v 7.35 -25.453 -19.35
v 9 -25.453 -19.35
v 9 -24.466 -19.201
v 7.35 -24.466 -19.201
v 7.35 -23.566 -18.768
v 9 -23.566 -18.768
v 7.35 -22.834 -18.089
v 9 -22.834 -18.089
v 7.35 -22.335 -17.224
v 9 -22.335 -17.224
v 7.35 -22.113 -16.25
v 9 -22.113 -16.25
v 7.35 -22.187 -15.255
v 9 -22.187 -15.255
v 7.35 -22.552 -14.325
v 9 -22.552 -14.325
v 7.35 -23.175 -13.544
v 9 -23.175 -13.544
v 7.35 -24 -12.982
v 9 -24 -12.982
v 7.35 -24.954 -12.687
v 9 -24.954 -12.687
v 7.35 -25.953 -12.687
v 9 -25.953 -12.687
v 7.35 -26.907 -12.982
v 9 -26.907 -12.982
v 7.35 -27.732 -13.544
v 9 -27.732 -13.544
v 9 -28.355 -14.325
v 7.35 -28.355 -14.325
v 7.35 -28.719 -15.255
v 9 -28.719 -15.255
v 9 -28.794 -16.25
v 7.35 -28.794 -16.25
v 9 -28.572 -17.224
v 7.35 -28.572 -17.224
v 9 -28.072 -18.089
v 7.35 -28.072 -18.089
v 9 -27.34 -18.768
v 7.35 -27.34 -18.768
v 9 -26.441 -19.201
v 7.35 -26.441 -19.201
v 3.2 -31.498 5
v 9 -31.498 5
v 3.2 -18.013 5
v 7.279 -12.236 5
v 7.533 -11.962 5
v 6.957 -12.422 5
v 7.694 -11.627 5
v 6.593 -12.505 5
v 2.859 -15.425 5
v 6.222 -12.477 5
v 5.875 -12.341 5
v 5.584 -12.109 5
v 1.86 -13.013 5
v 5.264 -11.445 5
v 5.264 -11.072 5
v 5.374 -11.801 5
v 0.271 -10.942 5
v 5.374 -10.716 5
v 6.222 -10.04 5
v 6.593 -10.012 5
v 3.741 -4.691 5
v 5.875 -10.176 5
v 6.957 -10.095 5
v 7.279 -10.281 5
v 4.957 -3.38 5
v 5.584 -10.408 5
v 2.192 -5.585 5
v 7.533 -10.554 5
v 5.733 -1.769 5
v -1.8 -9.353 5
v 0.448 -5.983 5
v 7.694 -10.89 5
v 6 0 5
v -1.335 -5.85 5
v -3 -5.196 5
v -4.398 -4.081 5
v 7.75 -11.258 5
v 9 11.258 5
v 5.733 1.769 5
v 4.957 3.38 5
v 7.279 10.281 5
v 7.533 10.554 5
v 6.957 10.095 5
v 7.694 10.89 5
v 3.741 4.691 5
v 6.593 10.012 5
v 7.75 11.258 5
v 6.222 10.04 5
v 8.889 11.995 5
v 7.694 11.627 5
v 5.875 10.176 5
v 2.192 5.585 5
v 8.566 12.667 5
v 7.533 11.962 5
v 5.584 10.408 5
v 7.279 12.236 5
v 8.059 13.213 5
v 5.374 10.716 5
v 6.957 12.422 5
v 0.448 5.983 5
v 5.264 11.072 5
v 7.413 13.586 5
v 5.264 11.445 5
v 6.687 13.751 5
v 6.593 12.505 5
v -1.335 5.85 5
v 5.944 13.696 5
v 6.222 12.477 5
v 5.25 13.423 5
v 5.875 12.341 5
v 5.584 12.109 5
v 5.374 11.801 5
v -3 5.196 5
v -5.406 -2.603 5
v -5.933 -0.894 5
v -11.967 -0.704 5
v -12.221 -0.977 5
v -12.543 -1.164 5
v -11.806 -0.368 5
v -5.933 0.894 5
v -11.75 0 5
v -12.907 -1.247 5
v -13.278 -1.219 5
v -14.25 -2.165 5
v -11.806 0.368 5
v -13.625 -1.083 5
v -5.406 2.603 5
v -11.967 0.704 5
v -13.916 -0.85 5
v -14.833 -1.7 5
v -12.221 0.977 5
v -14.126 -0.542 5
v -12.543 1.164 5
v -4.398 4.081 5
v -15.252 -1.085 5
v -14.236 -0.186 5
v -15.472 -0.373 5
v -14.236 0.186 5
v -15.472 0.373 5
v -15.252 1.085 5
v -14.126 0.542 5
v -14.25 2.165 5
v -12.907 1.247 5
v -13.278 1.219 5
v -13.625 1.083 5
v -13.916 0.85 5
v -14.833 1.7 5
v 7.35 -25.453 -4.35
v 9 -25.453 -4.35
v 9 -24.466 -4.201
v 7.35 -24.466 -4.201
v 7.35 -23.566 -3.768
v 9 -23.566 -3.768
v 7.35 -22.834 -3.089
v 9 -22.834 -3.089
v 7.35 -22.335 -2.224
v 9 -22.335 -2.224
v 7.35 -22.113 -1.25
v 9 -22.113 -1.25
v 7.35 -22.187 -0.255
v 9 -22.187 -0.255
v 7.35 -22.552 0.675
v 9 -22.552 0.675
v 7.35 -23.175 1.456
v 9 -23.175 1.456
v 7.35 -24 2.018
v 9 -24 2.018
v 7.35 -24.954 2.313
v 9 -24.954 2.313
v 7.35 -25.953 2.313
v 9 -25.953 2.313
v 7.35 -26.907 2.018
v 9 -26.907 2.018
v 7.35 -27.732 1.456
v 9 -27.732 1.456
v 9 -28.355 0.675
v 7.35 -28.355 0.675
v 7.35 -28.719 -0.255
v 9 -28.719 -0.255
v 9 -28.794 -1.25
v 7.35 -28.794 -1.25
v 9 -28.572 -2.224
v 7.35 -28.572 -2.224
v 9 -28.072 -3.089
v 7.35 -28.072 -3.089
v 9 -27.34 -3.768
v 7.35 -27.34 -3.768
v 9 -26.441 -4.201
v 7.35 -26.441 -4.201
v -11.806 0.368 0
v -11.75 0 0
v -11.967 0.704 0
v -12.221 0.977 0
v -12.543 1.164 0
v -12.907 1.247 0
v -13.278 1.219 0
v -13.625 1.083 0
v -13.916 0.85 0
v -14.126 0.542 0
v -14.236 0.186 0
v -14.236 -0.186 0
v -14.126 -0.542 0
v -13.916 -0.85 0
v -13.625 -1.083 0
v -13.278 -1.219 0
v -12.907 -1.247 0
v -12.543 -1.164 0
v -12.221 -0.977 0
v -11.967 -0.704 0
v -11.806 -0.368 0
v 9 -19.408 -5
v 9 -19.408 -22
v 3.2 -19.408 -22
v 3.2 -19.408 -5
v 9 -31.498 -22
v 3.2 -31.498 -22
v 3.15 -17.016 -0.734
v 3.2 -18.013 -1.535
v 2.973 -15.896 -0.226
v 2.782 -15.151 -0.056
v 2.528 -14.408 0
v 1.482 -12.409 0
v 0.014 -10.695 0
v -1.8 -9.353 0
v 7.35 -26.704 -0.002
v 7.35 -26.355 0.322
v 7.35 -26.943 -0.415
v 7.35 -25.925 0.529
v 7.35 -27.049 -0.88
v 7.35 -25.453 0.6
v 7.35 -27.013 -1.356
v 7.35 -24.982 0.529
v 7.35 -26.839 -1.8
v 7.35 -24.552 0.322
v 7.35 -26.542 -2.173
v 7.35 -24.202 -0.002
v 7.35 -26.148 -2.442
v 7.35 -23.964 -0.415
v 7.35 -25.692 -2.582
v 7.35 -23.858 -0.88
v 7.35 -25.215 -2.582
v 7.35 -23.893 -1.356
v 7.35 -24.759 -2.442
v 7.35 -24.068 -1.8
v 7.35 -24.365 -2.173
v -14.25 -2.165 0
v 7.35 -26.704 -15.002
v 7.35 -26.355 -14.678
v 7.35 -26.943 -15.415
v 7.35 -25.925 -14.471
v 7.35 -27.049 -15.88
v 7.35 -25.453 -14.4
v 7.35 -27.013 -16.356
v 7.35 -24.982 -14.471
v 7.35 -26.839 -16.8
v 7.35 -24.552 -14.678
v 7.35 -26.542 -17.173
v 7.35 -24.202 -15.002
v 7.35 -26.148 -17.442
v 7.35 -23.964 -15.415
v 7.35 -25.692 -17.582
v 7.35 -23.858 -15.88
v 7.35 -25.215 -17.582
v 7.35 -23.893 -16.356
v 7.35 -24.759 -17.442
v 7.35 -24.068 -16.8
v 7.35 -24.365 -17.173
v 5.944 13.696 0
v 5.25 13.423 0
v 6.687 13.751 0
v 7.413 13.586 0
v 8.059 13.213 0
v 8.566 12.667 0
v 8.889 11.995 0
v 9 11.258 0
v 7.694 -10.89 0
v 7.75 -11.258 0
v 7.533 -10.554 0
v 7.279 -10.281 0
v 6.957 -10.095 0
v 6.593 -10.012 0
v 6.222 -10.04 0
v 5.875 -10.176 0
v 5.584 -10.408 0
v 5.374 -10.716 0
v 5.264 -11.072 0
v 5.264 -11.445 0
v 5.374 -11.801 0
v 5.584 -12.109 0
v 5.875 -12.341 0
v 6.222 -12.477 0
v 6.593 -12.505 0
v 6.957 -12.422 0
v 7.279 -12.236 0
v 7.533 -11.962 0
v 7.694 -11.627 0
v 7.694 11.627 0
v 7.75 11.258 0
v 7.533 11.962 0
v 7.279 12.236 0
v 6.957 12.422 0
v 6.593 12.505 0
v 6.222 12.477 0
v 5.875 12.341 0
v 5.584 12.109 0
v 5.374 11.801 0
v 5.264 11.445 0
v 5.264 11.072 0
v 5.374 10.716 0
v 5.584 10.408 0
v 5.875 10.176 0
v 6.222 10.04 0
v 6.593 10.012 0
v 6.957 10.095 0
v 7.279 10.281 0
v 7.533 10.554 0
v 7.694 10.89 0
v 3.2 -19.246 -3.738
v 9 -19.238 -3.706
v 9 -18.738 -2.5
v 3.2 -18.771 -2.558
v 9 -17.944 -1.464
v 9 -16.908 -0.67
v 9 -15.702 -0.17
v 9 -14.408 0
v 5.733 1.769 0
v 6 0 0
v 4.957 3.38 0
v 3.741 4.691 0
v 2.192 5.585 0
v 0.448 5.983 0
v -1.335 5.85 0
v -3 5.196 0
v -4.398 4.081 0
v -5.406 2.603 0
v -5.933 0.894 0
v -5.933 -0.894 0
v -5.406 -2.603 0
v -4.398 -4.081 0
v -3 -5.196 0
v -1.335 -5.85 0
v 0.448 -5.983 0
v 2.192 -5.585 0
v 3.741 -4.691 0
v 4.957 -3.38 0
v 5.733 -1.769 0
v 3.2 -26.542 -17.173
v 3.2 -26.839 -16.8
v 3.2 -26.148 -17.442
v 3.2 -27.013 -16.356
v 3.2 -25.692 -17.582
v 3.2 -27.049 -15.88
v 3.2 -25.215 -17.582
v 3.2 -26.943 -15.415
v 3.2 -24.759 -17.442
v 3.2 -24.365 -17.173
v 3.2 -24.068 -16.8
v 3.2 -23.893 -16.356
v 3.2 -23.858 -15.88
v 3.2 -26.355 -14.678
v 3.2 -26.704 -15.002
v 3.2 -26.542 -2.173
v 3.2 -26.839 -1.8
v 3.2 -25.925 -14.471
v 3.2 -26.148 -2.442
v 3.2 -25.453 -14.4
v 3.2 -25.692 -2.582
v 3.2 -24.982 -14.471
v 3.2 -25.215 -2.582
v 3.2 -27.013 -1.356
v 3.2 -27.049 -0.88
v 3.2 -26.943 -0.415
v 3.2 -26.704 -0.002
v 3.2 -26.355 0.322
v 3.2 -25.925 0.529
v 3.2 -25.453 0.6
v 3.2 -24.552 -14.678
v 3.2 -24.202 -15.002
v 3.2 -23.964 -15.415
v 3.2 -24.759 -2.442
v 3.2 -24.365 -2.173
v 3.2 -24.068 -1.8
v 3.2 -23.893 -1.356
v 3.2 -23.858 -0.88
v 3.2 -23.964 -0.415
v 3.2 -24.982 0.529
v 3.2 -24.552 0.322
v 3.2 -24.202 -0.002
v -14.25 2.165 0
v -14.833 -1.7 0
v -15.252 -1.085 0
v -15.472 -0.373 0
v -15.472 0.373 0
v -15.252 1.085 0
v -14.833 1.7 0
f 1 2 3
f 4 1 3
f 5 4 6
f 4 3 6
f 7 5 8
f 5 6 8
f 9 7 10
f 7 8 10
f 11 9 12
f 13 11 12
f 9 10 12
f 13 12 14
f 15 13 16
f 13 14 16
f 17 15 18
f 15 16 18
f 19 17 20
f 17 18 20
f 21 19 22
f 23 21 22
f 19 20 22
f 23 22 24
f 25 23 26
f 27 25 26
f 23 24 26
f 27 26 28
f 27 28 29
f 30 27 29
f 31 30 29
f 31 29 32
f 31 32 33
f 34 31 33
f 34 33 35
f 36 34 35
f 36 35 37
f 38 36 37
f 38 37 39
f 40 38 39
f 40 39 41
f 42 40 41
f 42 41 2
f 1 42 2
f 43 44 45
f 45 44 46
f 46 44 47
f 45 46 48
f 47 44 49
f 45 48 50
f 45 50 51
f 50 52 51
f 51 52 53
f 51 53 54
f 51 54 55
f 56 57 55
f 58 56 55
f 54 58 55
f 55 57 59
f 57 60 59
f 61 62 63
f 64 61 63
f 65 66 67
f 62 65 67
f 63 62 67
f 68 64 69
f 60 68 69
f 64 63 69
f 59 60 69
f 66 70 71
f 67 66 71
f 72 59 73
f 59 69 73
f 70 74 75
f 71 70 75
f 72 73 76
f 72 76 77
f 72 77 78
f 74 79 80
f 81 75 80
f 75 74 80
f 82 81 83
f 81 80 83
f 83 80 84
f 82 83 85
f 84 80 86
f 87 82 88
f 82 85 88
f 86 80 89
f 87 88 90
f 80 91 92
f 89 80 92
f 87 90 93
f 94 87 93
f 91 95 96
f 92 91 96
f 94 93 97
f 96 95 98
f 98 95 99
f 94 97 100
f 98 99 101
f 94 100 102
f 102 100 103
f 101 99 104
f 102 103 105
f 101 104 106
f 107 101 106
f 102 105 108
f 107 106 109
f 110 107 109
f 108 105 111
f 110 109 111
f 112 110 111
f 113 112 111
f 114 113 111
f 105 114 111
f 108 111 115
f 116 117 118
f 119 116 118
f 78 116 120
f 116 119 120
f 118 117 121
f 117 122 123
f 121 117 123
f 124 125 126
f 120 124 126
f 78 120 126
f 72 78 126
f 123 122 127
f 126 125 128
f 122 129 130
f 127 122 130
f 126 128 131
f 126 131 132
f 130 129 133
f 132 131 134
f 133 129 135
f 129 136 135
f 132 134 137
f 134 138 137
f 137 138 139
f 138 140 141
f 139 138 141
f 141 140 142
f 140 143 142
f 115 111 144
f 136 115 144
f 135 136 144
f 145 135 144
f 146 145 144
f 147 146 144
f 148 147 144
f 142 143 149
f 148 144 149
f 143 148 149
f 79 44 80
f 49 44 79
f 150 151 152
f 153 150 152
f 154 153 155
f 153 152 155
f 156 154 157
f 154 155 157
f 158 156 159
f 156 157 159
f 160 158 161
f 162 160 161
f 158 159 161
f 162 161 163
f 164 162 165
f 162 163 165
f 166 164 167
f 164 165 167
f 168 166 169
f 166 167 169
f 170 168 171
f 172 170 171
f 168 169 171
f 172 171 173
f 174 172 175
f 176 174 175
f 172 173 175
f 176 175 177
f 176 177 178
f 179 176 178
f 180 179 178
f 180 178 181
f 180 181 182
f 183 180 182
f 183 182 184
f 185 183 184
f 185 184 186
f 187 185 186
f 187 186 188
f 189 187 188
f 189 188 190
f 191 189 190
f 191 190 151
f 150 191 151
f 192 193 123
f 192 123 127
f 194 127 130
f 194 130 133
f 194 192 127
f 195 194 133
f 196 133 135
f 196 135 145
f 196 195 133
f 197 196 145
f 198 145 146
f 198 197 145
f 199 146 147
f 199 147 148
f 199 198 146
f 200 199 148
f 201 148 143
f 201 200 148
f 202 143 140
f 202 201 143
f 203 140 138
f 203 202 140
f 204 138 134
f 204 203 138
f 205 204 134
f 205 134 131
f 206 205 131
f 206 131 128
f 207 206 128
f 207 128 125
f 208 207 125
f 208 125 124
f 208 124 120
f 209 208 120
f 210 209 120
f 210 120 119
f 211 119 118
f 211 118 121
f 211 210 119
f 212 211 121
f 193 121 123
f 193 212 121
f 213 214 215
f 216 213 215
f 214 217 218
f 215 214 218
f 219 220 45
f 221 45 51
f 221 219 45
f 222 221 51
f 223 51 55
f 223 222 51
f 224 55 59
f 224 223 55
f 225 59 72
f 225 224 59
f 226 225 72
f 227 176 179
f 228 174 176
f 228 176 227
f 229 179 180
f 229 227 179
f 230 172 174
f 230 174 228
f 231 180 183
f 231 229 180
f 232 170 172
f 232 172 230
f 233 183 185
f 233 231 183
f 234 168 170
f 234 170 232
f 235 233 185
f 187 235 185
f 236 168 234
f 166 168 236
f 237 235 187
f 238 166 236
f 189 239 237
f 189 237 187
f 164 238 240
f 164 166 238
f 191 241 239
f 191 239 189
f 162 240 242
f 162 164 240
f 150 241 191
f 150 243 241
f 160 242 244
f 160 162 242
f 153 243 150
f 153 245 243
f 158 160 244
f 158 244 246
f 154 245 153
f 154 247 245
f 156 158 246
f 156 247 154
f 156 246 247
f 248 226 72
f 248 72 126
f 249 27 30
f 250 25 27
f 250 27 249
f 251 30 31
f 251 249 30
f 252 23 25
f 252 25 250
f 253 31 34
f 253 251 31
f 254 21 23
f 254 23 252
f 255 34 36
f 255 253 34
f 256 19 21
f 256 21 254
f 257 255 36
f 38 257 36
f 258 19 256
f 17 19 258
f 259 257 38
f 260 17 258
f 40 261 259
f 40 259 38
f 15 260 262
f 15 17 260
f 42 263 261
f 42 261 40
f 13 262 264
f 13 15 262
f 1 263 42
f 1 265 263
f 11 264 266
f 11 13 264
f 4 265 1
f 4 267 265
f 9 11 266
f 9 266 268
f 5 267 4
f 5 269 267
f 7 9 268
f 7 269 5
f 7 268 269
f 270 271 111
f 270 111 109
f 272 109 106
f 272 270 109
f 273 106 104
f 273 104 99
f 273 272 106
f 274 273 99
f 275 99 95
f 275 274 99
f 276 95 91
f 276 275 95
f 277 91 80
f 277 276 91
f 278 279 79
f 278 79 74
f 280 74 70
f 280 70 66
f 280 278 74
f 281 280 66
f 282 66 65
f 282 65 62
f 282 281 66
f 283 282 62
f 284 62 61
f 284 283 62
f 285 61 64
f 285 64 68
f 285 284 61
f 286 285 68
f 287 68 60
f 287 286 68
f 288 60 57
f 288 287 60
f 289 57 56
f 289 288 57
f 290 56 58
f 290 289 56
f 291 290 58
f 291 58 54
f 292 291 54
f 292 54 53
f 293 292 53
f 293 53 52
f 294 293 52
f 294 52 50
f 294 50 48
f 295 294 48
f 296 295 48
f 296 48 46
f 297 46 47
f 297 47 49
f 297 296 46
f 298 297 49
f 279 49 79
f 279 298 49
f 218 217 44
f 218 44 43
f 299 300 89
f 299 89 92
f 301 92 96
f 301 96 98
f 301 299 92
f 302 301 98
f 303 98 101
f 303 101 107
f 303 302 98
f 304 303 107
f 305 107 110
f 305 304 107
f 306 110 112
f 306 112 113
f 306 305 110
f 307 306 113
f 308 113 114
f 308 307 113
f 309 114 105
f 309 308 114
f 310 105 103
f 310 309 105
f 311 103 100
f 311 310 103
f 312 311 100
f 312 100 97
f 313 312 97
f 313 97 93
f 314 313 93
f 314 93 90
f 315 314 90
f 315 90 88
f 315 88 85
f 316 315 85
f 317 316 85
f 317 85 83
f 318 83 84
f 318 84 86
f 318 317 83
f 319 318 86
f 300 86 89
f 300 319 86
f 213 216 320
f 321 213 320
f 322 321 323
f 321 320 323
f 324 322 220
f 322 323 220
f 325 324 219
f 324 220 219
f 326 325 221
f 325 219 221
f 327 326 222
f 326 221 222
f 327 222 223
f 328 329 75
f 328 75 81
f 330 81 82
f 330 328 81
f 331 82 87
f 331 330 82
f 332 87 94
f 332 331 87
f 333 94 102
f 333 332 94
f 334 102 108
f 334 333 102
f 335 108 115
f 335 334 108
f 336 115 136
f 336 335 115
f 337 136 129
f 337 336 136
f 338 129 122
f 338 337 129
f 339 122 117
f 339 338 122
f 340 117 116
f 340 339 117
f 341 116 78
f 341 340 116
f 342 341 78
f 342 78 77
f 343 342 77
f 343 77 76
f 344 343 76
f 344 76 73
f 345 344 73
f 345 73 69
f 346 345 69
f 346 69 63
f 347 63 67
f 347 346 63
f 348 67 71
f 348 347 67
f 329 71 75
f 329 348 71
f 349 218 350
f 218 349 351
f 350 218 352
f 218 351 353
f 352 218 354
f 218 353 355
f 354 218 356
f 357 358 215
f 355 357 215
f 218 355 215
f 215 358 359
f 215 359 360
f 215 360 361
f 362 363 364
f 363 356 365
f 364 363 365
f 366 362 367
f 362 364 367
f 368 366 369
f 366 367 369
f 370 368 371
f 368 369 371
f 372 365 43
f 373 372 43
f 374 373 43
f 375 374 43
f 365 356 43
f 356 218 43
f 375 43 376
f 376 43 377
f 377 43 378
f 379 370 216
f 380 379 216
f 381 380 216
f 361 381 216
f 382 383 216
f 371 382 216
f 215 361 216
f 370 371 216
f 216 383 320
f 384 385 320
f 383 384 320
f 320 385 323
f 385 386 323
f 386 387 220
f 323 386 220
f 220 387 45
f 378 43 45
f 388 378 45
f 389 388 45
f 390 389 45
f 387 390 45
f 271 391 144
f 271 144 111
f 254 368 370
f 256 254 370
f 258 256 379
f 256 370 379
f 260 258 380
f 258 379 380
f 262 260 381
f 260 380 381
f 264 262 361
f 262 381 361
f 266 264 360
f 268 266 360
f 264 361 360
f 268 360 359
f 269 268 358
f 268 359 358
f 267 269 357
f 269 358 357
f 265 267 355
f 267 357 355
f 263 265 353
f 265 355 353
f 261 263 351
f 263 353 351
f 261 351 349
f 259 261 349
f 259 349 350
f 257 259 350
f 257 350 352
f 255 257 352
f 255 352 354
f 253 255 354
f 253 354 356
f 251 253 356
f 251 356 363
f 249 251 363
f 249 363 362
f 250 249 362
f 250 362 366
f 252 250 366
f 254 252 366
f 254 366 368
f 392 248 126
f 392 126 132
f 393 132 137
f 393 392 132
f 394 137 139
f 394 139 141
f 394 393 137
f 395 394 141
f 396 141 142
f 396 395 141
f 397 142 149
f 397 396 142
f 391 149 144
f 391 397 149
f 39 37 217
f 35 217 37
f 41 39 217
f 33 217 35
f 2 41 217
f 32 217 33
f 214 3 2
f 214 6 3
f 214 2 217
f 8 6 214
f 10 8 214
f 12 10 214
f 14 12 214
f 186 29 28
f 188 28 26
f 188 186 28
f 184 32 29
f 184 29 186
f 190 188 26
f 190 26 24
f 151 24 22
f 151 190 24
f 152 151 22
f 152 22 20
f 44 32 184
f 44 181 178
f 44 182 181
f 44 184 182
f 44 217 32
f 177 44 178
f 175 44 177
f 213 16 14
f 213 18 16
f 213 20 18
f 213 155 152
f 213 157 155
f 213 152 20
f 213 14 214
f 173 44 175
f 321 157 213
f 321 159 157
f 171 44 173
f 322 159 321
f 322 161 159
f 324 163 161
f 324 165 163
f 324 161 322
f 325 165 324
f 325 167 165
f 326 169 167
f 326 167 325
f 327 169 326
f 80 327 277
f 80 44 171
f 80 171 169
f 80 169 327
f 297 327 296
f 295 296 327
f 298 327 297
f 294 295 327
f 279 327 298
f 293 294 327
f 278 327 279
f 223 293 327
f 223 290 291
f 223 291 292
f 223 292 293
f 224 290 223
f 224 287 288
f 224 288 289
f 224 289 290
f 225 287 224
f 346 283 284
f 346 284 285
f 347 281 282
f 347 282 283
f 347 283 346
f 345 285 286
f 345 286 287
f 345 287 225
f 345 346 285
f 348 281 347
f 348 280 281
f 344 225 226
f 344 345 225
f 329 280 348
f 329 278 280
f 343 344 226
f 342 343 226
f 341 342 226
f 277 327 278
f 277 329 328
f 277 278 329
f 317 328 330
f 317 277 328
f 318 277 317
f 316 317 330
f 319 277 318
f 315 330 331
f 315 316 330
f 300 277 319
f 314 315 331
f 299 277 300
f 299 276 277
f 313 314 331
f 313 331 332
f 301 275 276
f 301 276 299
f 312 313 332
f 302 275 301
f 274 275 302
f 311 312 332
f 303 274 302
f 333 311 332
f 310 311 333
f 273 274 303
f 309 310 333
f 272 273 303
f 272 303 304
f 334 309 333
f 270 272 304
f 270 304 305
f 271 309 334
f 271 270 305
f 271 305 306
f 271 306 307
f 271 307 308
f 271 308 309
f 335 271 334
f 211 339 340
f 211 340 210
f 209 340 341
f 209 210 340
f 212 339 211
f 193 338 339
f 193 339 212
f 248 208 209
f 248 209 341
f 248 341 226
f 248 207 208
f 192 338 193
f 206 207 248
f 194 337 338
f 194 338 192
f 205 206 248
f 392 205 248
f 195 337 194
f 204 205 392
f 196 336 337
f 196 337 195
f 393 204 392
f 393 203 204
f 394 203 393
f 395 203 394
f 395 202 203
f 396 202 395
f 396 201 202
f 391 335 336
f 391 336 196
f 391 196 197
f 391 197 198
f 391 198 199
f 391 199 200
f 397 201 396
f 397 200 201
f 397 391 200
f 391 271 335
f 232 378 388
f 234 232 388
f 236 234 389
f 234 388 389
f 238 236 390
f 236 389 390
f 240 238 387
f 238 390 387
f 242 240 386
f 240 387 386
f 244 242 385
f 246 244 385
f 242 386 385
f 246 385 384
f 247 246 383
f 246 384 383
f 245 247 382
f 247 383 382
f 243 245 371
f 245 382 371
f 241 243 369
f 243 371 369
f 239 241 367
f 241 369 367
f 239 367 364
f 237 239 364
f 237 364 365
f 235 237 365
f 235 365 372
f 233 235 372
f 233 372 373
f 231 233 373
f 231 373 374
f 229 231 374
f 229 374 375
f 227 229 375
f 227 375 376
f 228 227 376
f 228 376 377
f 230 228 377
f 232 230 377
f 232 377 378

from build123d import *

# Parameters (mm, degrees)
ESBO_O1_R                          = 6
ESBO_O1_R_2                        = 1.25
RESSALTO_EXTRUS_O1_DEPTH           = 5
ESBO_O2_W                          = 5.8
ESBO_O2_H                          = 12.09
RESSALTO_EXTRUS_O2_DEPTH           = 22
REBAIXO_PARA_SBHCS_M31_D           = 3.2
REBAIXO_PARA_SBHCS_M31_DEPTH       = 5.8
REBAIXO_PARA_SBHCS_M31_CBORE_D     = 6.7
REBAIXO_PARA_SBHCS_M31_CBORE_DEPTH = 1.65
FILETE1_R                          = 5


with BuildPart() as part:
    # Esboço1 → Ressalto-extrusão1 (new body)
    with BuildSketch(Plane.XY):
        with BuildLine():
            Line((-14.25, 2.165063509), (5.25, 13.423393759))
            ThreePointArc((5.25, 13.423393759), (7.75, 13.423393759), (9, 11.258330249))
            Line((9, 11.258330249), (9, -11.258330249))
            Line((9, -11.258330249), (9, -31.498330249))
            Line((9, -31.498330249), (3.2, -31.498330249))
            Line((3.2, -31.498330249), (3.2, -19.408330249))
            Line((3.2, -19.408330249), (3.2, -18.013328399))
            ThreePointArc((3.2, -18.013328399), (1.860254038, -13.013328399), (-1.8, -9.353074361))
            Line((-1.8, -9.353074361), (-14.25, -2.165063509))
            ThreePointArc((-14.25, -2.165063509), (-15.5, 0), (-14.25, 2.165063509))
        make_face()
        Circle(ESBO_O1_R, mode=Mode.SUBTRACT)
        with Locations((6.5, -11.258330249)):
            Circle(ESBO_O1_R_2, mode=Mode.SUBTRACT)
        with Locations((6.5, 11.258330249)):
            Circle(ESBO_O1_R_2, mode=Mode.SUBTRACT)
        with Locations((-13, 0)):
            Circle(ESBO_O1_R_2, mode=Mode.SUBTRACT)
    extrude(amount=RESSALTO_EXTRUS_O1_DEPTH)

    # Esboço2 → Ressalto-extrusão2 (add)
    with BuildSketch(Plane(origin=(0, 0, 0), x_dir=(-1, 0, 0), z_dir=(0, 0, -1))):
        with Locations((-6.1, -25.453330249)):
            Rectangle(ESBO_O2_W, ESBO_O2_H)
    extrude(amount=RESSALTO_EXTRUS_O2_DEPTH)

    # Rebaixo para SBHCS M31
    with Locations(Plane(origin=(9, 0, 0), x_dir=(0, 0, -1), z_dir=(1, 0, 0))):
        with Locations((1, -25.453330249), (16, -25.453330249)):
            CounterBoreHole(REBAIXO_PARA_SBHCS_M31_D / 2, REBAIXO_PARA_SBHCS_M31_CBORE_D / 2, REBAIXO_PARA_SBHCS_M31_CBORE_DEPTH, depth=REBAIXO_PARA_SBHCS_M31_DEPTH)

    # Filete1
    filete1_edges = [part.edges().sort_by_distance(p)[0] for p in [
        (6.1, -19.408330249, 0),
    ]]
    fillet(filete1_edges, radius=FILETE1_R)


solid = part.part
